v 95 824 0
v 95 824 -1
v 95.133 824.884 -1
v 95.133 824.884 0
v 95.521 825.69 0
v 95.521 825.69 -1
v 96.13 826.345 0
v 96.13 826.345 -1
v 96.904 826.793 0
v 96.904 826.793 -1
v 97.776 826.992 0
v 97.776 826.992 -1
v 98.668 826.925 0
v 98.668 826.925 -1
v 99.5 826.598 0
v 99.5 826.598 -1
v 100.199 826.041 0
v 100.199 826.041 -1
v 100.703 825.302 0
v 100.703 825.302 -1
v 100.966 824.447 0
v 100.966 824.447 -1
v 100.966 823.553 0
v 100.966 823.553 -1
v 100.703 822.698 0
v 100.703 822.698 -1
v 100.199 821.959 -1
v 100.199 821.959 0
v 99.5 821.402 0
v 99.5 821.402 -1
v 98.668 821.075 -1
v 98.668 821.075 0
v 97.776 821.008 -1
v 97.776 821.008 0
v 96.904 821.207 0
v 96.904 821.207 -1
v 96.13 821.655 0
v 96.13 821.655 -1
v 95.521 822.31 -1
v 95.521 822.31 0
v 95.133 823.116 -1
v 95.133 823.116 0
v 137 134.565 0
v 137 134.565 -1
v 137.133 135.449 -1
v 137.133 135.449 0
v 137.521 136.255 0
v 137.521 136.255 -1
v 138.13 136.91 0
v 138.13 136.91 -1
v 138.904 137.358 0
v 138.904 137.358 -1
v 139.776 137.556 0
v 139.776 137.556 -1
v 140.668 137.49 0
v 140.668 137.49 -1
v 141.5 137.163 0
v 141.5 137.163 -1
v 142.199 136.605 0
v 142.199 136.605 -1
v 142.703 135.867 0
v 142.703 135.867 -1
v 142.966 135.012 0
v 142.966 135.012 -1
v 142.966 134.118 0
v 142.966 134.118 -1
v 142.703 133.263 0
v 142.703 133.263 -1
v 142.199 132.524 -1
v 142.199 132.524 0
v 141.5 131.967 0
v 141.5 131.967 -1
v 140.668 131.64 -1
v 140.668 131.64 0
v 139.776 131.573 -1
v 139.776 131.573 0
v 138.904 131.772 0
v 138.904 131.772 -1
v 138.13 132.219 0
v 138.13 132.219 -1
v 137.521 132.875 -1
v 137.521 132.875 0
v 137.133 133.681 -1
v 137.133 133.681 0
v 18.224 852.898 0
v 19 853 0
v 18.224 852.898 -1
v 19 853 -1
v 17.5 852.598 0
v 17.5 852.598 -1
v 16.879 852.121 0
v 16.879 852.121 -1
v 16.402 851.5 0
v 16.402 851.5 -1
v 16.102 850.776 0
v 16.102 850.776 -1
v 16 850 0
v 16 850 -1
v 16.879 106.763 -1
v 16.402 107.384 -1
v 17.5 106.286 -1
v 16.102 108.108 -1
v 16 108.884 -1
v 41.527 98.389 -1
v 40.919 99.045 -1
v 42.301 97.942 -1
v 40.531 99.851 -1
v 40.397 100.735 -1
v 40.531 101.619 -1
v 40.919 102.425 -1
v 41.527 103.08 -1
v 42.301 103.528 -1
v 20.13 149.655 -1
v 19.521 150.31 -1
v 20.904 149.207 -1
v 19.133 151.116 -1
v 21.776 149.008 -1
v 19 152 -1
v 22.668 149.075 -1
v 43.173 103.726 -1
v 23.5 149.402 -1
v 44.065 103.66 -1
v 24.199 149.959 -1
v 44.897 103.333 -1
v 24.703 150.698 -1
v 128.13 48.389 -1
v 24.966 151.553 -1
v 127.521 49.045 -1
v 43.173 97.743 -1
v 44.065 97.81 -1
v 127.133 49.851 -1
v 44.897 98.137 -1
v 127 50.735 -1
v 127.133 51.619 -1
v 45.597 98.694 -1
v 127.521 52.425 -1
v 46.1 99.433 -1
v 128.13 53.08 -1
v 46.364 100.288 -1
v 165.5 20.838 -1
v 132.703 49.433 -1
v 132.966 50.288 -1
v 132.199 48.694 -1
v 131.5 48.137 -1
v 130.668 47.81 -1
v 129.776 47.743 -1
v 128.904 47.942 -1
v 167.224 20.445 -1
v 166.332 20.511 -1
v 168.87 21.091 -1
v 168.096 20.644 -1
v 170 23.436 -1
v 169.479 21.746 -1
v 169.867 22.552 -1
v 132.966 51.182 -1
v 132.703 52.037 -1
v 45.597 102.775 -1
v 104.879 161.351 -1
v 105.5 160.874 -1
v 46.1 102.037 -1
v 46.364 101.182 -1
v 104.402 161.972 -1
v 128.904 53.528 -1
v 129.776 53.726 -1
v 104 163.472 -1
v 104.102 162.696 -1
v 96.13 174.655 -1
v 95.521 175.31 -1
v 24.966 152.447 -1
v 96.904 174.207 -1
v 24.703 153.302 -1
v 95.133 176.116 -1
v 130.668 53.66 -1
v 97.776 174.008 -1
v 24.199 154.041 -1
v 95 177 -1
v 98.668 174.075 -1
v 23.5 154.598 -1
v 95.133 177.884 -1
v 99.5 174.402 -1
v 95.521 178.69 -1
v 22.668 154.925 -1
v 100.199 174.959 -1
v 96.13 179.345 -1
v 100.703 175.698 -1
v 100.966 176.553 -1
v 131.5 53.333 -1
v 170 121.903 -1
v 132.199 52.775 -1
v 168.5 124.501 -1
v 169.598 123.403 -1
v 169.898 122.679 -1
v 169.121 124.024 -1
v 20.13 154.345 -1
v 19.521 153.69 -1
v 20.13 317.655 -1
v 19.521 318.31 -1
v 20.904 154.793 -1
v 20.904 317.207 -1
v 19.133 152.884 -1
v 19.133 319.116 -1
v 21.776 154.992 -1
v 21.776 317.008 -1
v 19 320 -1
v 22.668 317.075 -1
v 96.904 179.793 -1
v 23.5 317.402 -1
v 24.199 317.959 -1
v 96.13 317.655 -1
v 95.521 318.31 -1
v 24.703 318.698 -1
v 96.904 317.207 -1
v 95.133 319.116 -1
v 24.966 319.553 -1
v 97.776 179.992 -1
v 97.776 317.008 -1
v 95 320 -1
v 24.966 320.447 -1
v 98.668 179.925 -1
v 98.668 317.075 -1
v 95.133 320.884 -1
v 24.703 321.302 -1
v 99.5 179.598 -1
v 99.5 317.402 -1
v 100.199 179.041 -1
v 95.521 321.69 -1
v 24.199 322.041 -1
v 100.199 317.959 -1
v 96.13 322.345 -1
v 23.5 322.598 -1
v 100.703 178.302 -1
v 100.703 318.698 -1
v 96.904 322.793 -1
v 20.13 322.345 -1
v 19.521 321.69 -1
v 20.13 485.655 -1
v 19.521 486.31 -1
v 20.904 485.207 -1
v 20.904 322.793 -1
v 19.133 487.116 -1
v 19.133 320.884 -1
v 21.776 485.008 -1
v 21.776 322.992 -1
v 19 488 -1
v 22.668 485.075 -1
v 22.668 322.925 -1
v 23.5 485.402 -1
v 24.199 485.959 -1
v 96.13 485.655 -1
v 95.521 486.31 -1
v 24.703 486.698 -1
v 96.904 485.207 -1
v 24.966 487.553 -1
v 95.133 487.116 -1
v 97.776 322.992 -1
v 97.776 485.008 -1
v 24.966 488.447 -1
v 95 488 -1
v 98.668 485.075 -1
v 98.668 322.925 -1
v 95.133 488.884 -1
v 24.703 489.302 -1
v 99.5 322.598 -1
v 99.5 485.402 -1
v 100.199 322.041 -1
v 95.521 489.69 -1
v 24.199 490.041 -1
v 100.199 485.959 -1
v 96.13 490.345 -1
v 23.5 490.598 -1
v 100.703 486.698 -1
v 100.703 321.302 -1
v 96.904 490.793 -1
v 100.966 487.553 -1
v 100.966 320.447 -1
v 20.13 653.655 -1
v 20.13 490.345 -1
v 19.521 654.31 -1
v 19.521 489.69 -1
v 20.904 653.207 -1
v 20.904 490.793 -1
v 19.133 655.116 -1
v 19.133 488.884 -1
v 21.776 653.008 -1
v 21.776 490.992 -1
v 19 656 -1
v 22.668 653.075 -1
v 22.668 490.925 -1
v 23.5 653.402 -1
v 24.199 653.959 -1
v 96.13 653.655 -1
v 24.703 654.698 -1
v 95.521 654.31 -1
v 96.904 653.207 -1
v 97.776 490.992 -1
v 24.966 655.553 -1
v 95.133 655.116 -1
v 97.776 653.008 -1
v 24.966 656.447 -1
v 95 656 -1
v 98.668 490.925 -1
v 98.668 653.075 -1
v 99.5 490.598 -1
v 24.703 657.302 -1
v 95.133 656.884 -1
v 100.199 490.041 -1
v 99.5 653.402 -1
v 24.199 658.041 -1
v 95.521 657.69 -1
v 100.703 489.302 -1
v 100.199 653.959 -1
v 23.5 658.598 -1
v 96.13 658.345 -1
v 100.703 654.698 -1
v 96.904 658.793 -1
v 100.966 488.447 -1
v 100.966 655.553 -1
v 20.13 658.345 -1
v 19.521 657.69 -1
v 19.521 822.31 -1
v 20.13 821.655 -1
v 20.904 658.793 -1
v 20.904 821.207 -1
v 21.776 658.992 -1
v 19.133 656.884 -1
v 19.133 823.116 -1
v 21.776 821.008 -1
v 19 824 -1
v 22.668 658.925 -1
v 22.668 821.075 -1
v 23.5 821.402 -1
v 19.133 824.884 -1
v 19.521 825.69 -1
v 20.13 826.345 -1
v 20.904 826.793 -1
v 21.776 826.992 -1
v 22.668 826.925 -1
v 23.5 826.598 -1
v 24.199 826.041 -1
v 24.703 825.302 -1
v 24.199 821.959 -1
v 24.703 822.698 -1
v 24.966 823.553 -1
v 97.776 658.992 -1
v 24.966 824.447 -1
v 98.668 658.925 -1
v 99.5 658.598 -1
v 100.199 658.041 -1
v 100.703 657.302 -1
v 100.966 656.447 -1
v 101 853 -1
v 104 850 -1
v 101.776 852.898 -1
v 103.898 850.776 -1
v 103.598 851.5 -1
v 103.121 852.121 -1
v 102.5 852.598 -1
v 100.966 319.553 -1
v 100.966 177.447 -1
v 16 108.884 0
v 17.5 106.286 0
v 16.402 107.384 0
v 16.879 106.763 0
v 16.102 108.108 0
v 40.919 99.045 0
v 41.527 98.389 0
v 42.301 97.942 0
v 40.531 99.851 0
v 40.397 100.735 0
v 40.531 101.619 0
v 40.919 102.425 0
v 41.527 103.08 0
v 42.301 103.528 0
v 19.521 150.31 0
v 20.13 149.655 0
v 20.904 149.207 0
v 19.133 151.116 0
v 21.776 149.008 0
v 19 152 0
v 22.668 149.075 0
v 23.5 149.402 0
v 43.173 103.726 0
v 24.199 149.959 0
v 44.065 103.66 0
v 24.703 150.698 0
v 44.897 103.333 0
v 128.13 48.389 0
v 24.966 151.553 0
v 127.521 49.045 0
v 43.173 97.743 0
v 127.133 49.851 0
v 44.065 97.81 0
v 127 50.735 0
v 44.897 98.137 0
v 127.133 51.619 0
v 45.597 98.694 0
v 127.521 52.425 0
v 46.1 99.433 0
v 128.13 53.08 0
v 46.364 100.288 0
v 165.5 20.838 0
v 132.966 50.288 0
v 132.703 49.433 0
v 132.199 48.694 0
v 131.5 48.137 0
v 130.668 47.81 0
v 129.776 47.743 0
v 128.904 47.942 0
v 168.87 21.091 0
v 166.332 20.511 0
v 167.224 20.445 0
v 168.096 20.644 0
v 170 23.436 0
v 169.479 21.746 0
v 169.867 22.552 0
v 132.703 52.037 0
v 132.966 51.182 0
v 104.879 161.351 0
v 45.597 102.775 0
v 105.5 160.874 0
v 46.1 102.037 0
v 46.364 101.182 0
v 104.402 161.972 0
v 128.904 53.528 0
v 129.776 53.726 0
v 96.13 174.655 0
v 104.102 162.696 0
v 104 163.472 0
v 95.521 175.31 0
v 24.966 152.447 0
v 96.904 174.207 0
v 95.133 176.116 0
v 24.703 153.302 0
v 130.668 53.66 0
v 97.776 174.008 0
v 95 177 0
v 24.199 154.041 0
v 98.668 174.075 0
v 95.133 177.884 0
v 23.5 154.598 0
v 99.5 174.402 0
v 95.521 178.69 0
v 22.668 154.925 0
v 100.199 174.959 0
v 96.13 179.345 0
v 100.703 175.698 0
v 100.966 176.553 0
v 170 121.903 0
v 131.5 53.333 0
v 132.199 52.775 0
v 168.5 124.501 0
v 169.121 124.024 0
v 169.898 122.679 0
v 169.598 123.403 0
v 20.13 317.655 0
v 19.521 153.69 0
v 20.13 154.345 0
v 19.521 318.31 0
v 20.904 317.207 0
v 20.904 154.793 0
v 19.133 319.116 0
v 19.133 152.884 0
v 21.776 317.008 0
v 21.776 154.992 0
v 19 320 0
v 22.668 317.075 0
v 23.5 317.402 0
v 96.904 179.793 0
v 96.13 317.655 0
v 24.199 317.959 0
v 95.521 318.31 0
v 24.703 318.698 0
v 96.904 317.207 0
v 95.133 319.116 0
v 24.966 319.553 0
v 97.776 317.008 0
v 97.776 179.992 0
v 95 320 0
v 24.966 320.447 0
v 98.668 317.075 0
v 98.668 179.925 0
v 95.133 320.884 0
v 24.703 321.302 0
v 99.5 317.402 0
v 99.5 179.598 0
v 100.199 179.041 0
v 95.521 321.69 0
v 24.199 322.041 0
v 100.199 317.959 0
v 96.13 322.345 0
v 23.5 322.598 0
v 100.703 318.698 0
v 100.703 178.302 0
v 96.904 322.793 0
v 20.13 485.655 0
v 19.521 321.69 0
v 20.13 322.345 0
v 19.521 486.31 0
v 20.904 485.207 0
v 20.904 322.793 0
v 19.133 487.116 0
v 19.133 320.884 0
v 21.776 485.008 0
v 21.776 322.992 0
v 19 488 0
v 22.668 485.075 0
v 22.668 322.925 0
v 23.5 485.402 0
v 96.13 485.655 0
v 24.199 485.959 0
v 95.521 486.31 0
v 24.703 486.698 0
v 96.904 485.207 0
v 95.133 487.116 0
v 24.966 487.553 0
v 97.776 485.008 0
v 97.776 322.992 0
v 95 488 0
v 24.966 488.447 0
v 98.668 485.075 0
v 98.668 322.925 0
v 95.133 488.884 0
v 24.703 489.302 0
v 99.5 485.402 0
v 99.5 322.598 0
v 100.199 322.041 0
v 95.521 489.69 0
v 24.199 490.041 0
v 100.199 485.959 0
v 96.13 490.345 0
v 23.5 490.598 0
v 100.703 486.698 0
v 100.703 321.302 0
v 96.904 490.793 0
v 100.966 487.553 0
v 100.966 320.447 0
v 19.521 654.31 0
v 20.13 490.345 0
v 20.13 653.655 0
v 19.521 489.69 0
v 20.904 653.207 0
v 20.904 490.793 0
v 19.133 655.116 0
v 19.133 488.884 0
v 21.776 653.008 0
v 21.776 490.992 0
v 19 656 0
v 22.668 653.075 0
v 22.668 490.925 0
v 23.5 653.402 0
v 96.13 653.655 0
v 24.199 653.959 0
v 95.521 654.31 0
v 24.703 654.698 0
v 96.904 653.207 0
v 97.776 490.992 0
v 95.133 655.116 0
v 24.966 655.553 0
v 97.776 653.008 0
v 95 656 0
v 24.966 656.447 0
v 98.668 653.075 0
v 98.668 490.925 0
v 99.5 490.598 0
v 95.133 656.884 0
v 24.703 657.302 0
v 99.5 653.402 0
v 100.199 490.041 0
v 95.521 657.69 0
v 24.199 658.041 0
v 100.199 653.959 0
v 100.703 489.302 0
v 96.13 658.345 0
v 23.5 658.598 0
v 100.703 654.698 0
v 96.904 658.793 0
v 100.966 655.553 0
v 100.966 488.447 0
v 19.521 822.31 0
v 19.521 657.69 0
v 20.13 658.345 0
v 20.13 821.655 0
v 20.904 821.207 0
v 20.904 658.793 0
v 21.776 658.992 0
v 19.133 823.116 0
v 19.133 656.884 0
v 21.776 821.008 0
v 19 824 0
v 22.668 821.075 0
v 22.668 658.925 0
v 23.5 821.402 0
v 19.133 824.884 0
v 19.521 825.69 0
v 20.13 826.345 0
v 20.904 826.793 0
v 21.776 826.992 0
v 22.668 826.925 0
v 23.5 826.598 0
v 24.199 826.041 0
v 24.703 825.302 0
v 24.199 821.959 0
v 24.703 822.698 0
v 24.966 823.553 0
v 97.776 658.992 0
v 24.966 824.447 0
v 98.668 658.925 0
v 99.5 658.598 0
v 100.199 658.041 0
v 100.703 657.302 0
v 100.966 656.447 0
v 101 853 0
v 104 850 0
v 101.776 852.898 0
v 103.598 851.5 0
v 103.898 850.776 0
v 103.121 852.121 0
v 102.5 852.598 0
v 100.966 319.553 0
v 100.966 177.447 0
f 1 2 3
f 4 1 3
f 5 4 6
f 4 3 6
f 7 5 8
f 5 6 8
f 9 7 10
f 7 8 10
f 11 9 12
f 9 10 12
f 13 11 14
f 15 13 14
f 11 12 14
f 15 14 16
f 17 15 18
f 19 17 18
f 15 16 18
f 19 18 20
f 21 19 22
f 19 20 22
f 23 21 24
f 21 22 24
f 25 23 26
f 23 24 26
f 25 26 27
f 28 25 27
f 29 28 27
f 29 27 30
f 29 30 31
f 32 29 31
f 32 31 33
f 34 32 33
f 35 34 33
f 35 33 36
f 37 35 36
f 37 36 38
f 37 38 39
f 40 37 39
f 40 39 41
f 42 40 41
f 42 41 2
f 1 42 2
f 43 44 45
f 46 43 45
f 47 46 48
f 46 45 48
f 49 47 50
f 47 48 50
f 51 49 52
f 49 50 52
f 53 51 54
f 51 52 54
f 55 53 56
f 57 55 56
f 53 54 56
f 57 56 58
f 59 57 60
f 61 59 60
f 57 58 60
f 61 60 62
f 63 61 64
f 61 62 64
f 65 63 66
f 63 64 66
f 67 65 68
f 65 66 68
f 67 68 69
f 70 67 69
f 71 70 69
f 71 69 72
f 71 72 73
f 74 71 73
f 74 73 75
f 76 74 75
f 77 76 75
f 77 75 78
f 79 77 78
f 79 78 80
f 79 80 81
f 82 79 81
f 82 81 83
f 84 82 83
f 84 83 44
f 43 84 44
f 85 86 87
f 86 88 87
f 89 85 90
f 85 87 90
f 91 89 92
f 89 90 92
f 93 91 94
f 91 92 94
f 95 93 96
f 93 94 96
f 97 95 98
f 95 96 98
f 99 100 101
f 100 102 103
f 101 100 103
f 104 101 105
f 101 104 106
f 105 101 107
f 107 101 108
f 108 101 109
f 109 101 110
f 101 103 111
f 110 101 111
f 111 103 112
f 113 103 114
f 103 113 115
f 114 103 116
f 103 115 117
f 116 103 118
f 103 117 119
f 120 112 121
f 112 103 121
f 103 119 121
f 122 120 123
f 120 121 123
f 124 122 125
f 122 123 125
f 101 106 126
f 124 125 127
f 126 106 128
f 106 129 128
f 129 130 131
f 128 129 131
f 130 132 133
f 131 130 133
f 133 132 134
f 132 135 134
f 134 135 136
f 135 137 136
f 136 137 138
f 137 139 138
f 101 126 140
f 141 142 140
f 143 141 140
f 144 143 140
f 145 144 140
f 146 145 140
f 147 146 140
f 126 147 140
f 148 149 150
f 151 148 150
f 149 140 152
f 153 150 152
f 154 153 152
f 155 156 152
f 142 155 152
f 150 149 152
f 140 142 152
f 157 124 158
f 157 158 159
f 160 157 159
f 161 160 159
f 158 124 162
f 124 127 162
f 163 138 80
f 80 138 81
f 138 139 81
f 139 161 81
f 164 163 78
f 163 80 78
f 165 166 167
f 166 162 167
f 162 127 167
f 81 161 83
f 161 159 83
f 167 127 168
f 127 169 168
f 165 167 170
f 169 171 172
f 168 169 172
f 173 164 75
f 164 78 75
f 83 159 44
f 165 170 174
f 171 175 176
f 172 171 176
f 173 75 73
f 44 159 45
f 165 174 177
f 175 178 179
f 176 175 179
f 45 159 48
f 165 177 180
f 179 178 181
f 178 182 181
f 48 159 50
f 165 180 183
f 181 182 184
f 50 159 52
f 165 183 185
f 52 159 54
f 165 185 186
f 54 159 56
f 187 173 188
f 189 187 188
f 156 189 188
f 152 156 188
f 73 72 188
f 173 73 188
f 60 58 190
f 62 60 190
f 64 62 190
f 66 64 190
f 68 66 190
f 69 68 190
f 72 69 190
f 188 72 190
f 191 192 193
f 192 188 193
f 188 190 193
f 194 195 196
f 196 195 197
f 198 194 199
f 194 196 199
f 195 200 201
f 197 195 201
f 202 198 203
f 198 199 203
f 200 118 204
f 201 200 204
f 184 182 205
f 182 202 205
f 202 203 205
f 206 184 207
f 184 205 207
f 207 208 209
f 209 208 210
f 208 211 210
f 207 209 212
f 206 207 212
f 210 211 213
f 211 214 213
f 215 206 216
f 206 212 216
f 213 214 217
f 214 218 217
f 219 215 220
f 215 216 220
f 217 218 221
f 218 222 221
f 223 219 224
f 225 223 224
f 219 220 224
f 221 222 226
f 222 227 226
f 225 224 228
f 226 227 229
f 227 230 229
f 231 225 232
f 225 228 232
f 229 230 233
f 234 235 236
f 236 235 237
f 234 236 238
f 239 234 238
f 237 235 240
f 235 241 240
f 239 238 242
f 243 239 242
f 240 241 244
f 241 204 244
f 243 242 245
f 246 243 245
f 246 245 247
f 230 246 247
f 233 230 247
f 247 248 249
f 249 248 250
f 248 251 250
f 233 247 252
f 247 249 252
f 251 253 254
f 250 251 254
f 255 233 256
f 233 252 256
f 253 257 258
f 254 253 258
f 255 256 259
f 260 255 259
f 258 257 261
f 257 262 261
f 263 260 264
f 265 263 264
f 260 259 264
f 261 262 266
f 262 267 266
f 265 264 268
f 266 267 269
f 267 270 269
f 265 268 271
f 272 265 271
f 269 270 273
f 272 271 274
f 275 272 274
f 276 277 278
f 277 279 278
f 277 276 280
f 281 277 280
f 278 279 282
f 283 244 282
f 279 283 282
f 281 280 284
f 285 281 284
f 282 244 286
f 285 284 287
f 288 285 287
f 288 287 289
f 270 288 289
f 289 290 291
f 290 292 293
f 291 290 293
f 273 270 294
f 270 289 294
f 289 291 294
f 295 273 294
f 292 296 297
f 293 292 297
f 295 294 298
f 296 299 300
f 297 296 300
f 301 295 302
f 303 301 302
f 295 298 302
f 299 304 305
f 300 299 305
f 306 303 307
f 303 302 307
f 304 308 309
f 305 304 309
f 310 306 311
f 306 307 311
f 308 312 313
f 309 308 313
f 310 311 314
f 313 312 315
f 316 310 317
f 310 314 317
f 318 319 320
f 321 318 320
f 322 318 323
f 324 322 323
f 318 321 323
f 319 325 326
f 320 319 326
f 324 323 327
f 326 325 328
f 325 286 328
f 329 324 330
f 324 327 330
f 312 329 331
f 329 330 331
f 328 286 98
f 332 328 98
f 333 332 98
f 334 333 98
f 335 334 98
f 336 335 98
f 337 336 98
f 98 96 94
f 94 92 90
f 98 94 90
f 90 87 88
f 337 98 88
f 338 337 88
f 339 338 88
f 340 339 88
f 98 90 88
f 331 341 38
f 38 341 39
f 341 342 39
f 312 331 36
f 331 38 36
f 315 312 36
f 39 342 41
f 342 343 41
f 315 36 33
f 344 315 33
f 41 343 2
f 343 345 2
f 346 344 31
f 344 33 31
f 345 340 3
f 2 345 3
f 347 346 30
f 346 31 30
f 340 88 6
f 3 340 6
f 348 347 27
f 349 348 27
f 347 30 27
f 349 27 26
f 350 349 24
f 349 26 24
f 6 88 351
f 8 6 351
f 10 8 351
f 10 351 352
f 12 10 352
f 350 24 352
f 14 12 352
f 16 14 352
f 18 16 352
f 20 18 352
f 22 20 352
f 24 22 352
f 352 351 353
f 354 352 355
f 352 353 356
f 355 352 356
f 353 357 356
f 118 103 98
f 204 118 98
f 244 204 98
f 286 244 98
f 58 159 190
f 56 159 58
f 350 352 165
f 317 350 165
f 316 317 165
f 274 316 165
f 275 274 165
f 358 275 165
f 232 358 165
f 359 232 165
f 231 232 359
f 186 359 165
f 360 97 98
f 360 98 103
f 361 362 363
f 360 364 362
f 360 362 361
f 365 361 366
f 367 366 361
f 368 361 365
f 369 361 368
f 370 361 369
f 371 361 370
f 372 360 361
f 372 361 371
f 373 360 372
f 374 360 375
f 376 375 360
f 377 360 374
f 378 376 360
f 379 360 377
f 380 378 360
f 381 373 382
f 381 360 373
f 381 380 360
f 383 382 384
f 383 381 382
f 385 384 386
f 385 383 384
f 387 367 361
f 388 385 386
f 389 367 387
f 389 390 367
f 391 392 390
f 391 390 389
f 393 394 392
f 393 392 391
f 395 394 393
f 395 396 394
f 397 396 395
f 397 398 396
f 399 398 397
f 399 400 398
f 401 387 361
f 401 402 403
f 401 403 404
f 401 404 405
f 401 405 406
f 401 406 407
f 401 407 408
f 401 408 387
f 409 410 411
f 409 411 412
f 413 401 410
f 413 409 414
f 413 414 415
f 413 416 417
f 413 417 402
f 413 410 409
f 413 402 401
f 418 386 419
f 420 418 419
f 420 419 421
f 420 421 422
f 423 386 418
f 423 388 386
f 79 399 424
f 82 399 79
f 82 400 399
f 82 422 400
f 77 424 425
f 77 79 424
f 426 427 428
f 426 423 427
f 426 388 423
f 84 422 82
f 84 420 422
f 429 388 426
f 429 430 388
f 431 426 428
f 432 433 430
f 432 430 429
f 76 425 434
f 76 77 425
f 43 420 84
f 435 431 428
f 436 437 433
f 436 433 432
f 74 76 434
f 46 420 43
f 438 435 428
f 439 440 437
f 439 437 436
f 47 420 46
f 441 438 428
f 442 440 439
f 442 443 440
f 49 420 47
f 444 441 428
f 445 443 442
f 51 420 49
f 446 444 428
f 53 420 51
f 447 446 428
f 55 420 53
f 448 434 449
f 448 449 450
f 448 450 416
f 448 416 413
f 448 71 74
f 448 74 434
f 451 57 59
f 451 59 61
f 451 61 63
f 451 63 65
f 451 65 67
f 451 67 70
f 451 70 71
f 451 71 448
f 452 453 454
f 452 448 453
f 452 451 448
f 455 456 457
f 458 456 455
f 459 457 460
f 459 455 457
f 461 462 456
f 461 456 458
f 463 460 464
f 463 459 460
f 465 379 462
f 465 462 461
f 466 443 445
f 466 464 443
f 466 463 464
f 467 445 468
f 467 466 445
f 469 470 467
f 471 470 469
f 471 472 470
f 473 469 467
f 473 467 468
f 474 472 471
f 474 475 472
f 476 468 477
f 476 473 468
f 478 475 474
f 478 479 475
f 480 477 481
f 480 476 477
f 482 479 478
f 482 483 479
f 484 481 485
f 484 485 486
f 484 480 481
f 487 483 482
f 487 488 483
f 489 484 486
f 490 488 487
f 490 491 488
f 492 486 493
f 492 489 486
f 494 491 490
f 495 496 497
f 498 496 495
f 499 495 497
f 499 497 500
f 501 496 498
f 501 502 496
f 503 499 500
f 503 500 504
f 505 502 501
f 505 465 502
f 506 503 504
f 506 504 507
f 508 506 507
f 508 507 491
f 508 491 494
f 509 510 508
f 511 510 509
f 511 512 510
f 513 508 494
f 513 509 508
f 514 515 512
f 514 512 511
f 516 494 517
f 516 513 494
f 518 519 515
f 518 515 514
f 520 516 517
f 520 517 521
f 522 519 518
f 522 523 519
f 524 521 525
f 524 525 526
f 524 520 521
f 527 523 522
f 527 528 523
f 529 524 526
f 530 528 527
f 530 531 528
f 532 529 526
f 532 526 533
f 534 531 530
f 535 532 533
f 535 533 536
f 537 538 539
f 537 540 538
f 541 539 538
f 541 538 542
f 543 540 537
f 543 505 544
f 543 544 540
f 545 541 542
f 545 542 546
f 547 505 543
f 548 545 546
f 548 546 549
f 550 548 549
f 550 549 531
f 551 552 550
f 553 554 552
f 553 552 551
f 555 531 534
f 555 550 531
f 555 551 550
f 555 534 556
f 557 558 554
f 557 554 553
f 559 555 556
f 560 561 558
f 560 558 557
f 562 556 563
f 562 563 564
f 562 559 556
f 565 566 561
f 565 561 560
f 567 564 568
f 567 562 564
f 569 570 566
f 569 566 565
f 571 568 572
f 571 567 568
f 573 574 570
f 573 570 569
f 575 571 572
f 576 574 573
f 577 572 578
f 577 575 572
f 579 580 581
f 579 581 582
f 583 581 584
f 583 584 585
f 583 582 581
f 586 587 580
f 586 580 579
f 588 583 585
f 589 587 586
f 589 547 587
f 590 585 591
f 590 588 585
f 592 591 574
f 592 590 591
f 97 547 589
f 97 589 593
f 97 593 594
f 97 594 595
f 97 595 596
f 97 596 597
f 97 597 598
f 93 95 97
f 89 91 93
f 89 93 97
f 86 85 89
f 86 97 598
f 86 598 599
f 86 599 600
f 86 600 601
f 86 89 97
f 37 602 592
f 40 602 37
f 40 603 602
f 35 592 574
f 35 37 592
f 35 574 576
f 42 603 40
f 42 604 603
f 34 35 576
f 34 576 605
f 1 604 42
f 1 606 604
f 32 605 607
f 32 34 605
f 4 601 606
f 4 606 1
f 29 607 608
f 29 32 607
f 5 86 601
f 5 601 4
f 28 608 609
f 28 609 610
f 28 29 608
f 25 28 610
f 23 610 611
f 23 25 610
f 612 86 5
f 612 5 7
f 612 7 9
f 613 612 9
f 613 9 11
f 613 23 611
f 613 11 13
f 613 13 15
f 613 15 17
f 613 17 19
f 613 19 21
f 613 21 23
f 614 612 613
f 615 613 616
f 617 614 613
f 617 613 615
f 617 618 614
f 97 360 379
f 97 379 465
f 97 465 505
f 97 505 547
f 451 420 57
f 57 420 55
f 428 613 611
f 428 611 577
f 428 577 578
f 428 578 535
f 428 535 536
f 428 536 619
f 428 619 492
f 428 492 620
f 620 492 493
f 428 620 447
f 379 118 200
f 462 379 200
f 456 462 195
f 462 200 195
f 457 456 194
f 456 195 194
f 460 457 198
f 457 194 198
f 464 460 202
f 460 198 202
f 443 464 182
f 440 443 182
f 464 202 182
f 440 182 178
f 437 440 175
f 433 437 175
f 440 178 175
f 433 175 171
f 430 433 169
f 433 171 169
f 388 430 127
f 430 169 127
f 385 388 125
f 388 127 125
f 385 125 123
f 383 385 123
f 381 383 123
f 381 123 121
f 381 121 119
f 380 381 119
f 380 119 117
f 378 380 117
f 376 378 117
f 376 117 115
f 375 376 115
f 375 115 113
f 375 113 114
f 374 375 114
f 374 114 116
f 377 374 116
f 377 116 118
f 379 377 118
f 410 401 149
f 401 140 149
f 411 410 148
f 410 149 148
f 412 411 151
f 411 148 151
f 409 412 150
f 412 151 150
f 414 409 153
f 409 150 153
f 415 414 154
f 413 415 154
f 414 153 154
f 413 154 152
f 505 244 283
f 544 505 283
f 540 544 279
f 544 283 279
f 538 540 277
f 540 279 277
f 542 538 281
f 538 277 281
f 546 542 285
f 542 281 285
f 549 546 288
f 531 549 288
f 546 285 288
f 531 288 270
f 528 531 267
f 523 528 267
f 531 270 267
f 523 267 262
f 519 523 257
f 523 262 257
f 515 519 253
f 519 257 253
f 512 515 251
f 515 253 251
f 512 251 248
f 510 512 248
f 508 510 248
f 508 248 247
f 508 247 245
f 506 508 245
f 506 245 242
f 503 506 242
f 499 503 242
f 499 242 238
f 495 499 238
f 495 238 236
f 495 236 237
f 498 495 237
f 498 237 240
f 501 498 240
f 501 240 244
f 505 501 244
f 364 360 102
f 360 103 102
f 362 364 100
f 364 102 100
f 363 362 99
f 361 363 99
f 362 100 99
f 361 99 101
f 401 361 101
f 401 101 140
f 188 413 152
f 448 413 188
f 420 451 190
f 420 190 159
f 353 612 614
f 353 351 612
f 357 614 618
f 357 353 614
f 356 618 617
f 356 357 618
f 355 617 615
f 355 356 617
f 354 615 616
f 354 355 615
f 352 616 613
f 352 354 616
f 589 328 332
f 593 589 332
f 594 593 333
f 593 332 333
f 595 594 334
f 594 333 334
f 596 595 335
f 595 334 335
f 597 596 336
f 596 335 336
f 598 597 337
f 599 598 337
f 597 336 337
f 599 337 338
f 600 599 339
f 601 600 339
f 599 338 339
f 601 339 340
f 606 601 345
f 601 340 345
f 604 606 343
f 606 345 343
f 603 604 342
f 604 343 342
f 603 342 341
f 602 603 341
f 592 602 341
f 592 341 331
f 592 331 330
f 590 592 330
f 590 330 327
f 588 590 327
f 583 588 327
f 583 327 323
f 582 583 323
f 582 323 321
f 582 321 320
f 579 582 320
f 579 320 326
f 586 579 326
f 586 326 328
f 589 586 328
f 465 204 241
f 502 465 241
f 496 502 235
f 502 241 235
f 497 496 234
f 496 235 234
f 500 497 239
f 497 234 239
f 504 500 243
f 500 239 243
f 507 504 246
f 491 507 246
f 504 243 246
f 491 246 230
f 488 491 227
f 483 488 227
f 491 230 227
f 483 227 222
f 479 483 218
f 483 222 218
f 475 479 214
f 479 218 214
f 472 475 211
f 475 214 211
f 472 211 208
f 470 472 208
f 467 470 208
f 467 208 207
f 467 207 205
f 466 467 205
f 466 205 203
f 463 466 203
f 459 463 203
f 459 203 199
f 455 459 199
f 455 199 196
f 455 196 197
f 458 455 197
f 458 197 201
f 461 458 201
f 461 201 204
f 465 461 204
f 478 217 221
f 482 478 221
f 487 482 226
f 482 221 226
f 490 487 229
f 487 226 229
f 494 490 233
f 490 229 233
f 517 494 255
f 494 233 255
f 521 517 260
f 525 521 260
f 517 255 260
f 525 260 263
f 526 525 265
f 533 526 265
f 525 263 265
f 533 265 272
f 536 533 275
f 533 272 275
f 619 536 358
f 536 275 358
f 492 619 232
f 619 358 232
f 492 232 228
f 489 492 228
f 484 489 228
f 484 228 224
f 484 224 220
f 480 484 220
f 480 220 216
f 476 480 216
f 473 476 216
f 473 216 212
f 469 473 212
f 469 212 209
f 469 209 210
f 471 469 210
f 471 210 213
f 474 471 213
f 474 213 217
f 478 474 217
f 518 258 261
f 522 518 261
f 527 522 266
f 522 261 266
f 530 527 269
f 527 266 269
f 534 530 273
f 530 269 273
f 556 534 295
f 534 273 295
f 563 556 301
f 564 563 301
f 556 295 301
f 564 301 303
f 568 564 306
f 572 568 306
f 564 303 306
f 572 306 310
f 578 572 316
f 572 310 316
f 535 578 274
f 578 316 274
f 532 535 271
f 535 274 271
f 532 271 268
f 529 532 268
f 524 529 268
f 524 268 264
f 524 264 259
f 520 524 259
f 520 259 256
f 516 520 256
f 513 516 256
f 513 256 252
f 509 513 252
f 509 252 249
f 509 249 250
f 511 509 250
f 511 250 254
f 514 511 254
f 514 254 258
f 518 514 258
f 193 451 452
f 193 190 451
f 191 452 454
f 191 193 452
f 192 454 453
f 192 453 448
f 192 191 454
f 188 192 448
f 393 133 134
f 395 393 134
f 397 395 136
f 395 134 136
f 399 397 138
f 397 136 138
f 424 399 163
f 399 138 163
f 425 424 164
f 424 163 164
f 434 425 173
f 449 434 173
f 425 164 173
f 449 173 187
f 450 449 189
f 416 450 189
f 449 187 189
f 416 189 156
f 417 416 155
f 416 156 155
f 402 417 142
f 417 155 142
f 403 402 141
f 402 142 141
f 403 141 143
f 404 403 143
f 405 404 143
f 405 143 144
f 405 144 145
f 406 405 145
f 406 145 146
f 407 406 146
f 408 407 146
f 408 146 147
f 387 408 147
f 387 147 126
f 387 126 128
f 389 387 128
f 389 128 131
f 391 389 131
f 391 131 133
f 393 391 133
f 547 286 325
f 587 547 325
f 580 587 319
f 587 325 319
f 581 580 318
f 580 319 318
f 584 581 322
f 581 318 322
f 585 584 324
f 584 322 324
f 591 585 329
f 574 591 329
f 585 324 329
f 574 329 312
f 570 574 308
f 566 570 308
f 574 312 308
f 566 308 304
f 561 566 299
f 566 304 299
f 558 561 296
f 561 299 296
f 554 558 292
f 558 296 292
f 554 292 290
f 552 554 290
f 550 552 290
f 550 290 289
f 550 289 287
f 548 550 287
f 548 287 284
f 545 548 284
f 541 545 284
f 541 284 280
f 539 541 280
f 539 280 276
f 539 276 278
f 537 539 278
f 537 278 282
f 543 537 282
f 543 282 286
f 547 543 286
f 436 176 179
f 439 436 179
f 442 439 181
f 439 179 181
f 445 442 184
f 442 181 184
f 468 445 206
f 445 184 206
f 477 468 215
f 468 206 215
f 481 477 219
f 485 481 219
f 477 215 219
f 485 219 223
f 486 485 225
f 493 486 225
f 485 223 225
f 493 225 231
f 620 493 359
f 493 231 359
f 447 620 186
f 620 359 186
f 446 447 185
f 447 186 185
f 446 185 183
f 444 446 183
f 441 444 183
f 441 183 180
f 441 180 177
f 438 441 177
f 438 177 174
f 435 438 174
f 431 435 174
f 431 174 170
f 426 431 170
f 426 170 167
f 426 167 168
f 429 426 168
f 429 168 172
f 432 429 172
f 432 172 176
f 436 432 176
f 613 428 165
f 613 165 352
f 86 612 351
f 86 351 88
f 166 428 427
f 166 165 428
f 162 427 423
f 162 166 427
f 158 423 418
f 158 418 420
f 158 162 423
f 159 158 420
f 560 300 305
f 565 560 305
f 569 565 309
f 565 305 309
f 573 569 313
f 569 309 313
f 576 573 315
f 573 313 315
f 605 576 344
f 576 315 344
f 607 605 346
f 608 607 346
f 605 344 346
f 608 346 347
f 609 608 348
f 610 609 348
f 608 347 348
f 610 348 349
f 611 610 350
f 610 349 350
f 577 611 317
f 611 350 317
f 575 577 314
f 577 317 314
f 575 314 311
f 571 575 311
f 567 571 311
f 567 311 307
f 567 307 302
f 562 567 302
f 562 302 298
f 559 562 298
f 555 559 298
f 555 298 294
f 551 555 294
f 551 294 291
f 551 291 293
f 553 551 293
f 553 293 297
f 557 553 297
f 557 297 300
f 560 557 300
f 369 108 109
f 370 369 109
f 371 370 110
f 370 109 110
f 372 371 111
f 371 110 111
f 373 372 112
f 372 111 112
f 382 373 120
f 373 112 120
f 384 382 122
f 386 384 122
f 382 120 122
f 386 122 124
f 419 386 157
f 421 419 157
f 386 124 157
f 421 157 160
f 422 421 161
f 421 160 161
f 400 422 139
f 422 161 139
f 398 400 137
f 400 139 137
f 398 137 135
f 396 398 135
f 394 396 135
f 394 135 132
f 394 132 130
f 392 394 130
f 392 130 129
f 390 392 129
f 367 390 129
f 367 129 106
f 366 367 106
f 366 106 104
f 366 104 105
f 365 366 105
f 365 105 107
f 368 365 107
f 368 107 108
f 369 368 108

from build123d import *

# Parameters (mm, degrees)
BASE_FLANGE1_DEPTH = 1
SKETCH2_R          = 3
CUT_EXTRUDE1_DEPTH = 10
FILLET1_R          = 3


# Sheet-metal steps are written as plain solids
with BuildPart() as part:
    # Sketch1 → Base-Flange1 (new body)
    with BuildSketch(Plane.XY):
        Polygon((104, 853), (16, 853), (16, 107.151941455), (170, 18.24), (170, 123.634882233), (104, 161.74), align=None)
    extrude(amount=-BASE_FLANGE1_DEPTH)

    # Sketch2 → Cut-Extrude1 (cut)
    with BuildSketch(Plane(origin=(0, 0, -1), x_dir=(-1, 0, 0), z_dir=(0, 0, -1))):
        with Locations((-22, 824)):
            Circle(SKETCH2_R)
        with Locations((-98, 824)):
            Circle(SKETCH2_R)
        with Locations((-98, 656)):
            Circle(SKETCH2_R)
        with Locations((-98, 488)):
            Circle(SKETCH2_R)
        with Locations((-98, 320)):
            Circle(SKETCH2_R)
        with Locations((-22, 656)):
            Circle(SKETCH2_R)
        with Locations((-22, 488)):
            Circle(SKETCH2_R)
        with Locations((-22, 320)):
            Circle(SKETCH2_R)
        with Locations((-22, 152)):
            Circle(SKETCH2_R)
        with Locations((-98, 177)):
            Circle(SKETCH2_R)
        with Locations((-140, 134.564882233)):
            Circle(SKETCH2_R)
        with Locations((-130, 50.734882233)):
            Circle(SKETCH2_R)
        with Locations((-43.397459622, 100.734882233)):
            Circle(SKETCH2_R)
    extrude(amount=-CUT_EXTRUDE1_DEPTH, mode=Mode.SUBTRACT)

    # Fillet1
    fillet1_edges = [part.edges().sort_by_distance(p)[0] for p in [
        (104, 161.74, -0.5),
        (170, 123.634882233, -0.5),
        (170, 18.24, -0.5),
        (16, 107.151941455, -0.5),
        (16, 853, -0.5),
        (104, 853, -0.5),
    ]]
    fillet(fillet1_edges, radius=FILLET1_R)


solid = part.part
